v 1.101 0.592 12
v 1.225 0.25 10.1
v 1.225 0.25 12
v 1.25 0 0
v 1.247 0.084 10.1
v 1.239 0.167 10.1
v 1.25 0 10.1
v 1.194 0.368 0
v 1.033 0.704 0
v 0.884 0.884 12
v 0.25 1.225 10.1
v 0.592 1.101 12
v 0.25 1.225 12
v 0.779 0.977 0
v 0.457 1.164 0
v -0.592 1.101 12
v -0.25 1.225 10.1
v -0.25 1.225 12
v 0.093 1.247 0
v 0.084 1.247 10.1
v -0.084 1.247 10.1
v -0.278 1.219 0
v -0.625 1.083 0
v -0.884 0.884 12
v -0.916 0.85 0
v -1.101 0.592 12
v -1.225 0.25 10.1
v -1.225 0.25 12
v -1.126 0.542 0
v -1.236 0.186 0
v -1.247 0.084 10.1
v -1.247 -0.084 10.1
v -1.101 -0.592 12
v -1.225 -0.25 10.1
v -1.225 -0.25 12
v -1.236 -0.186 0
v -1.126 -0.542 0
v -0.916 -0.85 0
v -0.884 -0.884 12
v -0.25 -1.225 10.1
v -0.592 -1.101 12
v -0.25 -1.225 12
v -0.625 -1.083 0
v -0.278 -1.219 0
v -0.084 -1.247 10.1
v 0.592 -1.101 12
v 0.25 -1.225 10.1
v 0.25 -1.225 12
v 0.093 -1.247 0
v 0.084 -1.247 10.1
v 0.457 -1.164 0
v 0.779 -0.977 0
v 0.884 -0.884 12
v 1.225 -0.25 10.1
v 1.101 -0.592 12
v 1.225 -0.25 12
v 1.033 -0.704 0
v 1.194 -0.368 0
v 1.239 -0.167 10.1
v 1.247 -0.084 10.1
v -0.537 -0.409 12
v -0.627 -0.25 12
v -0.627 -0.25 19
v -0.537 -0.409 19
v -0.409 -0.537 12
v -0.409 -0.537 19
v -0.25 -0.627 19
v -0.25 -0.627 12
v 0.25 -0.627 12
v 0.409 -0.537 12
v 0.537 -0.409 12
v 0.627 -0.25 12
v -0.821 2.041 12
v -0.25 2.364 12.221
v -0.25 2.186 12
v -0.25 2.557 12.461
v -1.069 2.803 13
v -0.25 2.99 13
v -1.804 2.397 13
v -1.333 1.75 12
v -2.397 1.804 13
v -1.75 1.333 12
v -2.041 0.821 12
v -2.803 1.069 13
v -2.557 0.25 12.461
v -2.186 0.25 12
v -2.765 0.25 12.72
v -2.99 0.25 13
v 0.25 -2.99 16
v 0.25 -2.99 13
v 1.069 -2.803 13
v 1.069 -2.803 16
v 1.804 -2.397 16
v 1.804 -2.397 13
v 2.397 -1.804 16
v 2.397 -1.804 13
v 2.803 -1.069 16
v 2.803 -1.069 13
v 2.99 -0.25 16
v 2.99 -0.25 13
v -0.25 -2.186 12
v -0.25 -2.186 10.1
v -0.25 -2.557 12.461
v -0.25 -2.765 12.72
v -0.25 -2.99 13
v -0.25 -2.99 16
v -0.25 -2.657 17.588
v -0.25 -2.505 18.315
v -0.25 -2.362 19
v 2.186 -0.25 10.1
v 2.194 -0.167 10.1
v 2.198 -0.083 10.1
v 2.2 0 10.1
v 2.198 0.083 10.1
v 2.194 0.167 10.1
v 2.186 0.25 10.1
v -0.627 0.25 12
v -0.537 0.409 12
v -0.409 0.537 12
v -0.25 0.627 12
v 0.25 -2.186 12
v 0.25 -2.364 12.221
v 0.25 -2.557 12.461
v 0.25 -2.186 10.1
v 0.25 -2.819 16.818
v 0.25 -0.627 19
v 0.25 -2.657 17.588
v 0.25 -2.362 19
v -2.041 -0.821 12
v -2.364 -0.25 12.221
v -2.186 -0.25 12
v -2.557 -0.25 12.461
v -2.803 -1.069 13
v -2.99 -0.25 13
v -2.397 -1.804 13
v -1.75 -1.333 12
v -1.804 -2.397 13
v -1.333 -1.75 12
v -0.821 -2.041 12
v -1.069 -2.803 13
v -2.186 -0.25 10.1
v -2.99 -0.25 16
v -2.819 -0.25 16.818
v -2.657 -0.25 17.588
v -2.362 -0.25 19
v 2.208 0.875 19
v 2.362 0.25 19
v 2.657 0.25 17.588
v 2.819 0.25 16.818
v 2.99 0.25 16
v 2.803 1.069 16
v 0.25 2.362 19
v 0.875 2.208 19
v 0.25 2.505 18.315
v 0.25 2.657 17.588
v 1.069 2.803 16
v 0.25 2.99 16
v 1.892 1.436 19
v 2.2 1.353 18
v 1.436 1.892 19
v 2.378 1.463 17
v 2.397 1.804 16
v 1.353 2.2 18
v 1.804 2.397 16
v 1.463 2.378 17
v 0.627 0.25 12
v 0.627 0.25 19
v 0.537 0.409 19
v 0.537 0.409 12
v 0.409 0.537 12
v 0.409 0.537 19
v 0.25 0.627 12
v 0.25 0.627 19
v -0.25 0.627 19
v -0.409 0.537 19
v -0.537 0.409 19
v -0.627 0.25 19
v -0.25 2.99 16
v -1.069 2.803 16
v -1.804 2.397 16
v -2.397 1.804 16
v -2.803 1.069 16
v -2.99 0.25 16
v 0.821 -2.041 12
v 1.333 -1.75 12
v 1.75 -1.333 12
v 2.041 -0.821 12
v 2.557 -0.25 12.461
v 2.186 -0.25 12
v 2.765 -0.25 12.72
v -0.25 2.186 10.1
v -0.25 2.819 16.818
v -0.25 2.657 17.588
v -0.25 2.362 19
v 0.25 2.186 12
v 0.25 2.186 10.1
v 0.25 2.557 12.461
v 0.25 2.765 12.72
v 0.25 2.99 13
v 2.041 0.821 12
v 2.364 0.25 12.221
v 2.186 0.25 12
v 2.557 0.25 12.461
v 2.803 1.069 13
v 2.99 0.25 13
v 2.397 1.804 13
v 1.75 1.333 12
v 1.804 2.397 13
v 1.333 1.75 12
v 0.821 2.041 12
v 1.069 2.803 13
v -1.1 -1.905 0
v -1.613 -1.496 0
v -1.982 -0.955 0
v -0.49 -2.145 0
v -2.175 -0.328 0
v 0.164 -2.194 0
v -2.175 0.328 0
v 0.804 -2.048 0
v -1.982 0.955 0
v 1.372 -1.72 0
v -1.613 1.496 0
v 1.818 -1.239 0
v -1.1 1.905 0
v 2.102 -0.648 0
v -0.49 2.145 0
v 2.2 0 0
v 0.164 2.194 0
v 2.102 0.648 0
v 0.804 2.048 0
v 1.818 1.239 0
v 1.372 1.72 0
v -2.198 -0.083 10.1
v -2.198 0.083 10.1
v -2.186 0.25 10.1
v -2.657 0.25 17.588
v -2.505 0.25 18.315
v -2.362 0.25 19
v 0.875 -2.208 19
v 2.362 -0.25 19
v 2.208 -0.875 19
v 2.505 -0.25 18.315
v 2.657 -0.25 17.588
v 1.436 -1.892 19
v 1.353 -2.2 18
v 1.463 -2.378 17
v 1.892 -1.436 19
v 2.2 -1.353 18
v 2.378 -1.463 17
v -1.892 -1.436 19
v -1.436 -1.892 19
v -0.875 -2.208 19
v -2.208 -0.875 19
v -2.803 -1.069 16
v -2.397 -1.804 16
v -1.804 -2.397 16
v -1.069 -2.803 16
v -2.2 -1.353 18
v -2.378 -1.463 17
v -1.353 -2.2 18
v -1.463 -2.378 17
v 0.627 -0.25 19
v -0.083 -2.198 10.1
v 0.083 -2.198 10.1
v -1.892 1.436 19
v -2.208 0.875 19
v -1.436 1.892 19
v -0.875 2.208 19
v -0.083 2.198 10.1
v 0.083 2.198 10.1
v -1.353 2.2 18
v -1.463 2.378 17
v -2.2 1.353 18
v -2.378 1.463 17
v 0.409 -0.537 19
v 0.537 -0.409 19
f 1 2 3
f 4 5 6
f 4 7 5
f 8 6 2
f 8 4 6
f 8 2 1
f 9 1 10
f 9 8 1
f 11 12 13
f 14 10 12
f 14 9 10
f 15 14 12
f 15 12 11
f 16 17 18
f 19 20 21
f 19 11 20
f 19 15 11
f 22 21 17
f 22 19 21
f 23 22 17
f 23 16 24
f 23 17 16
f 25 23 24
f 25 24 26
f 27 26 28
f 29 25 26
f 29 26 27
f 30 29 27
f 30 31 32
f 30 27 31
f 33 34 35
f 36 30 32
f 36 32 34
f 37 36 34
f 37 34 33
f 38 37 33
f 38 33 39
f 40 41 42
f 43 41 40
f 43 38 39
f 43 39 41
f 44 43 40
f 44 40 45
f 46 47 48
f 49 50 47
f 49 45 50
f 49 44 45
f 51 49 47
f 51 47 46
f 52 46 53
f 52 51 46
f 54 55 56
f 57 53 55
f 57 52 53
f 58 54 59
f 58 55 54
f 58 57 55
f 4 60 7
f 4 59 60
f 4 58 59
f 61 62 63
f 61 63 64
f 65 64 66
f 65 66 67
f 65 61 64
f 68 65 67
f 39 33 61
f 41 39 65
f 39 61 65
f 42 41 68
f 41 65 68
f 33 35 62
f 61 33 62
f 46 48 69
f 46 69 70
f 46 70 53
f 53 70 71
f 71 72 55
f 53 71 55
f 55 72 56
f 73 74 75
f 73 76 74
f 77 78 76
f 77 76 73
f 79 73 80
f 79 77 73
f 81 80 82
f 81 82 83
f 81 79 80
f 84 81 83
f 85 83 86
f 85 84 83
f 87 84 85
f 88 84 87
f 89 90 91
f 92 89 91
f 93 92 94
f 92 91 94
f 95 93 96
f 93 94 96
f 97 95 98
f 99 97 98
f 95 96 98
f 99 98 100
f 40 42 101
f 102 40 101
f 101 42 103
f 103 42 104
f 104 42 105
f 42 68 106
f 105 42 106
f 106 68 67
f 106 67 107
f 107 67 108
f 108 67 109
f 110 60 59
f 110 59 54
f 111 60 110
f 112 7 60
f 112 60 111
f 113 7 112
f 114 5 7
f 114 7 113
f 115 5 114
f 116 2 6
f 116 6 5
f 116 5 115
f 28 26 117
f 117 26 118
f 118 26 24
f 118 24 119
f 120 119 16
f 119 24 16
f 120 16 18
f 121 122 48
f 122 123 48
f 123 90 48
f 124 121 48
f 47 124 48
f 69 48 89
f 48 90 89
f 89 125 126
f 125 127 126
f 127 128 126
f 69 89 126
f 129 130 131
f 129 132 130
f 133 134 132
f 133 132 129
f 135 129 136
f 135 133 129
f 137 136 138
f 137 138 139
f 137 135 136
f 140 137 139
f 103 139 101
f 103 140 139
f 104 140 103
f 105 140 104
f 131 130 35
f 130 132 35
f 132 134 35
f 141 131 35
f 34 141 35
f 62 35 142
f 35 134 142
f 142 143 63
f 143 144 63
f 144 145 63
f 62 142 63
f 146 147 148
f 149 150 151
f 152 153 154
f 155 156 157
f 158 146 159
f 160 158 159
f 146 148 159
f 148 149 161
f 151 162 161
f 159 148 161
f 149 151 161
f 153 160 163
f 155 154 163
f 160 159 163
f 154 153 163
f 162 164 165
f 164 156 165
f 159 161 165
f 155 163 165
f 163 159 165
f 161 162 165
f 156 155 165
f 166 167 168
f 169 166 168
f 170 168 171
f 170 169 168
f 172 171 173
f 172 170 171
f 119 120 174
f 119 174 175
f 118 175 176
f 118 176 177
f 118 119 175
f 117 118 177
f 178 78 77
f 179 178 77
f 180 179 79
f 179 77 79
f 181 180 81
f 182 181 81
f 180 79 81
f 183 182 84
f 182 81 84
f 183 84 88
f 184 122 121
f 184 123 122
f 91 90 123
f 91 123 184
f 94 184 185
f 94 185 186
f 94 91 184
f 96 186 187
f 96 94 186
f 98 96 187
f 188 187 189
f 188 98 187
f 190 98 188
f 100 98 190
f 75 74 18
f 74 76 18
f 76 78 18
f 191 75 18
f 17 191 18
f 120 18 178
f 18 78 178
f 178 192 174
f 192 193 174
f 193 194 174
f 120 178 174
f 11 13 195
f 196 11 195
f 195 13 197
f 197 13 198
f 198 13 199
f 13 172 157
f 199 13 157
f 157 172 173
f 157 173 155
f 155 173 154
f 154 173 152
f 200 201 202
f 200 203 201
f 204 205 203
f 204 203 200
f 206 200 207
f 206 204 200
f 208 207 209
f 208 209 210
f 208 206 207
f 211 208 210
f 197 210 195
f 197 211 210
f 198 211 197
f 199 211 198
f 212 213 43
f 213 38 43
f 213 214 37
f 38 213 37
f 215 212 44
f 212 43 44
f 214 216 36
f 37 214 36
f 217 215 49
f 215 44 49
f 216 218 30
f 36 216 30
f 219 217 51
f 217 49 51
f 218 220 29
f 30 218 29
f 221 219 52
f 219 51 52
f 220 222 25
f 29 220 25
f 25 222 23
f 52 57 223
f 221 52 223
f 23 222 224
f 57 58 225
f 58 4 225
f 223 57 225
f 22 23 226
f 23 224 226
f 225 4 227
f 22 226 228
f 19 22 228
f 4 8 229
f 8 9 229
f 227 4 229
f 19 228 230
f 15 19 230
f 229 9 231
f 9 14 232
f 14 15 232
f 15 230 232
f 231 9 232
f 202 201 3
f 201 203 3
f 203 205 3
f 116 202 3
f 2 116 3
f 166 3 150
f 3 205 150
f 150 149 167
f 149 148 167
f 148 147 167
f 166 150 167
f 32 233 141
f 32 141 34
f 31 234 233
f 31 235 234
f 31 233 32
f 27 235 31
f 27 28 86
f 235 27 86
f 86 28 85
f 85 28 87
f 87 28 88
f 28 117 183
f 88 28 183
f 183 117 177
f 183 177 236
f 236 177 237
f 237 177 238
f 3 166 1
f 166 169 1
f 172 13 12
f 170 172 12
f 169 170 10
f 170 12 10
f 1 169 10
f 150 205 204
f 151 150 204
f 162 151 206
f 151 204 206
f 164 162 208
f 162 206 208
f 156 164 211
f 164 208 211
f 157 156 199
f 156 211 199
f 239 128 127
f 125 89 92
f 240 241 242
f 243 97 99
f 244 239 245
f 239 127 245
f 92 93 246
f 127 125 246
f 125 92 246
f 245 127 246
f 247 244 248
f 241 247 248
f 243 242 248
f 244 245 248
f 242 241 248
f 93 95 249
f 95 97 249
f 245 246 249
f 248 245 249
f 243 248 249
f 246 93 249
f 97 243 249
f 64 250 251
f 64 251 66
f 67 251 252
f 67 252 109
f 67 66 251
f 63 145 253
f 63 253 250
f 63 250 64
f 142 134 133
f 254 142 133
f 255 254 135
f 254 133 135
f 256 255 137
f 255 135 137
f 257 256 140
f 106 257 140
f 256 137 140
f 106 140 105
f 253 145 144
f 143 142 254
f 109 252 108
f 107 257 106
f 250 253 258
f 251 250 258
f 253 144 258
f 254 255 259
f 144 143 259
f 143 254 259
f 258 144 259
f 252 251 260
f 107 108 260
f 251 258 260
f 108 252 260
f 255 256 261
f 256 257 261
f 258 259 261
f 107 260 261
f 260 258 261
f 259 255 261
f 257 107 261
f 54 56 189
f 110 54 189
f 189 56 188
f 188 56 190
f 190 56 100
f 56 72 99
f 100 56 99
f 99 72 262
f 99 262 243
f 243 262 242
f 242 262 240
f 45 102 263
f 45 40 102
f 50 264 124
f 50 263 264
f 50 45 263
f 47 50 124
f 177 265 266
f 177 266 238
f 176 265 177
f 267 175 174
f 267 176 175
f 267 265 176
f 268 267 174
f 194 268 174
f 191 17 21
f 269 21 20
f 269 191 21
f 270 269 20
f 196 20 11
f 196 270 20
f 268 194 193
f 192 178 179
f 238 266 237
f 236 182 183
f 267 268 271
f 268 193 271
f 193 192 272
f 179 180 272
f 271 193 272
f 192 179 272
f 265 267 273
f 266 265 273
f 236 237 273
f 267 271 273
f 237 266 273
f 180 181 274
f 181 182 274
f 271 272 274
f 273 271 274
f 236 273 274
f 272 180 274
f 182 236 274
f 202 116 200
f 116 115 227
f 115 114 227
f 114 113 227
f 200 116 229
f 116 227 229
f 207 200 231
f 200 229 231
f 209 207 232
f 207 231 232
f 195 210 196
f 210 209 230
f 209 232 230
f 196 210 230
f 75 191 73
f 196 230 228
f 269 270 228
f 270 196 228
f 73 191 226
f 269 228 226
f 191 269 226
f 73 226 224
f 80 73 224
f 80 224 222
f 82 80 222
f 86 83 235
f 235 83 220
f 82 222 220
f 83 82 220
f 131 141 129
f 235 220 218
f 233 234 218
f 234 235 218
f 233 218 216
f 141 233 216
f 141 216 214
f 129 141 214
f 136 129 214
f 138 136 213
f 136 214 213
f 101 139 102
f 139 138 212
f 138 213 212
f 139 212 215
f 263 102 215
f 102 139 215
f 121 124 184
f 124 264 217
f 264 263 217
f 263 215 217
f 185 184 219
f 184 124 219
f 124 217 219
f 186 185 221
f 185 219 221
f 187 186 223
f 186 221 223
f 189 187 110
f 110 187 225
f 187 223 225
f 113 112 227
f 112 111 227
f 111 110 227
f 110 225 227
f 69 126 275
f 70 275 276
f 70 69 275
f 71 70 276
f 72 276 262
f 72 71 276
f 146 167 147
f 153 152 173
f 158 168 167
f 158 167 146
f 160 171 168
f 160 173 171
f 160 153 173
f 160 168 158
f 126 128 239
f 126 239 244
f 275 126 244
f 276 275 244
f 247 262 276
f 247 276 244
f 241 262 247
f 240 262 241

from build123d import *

# Parameters (mm, degrees)
SKETCH1_R           = 2.2
SKETCH1_R_2         = 1.25
BOSS_EXTRUDE1_DEPTH = 12
SKETCH2_R           = 3
SKETCH2_R_2         = 0.675
BOSS_EXTRUDE2_DEPTH = 7
CUT_EXTRUDE1_DEPTH  = 8.9


with BuildPart() as part:
    # Sketch1 → Boss-Extrude1 (new body)
    with BuildSketch(Plane.XY):
        Circle(SKETCH1_R)
        Circle(SKETCH1_R_2, mode=Mode.SUBTRACT)
    extrude(amount=BOSS_EXTRUDE1_DEPTH)

    # Sketch2 → Boss-Extrude2 (add)
    with BuildSketch(Plane.XY.offset(12)):
        Circle(SKETCH2_R)
        Circle(SKETCH2_R_2, mode=Mode.SUBTRACT)
    extrude(amount=BOSS_EXTRUDE2_DEPTH)

    # Sketch3 → Cut-Revolve1 (revolve, cut)
    with BuildSketch(Plane(origin=(0, 0, 0), x_dir=(1, 0, 0), z_dir=(0, 1, 0))):
        Polygon((2.2, -12), (3, -13), (4.276308893, -12.361058563), (3.46784885, -11.152134436), align=None)
        Polygon((2.375, -19), (3, -16), (5.751760011, -17.171813113), (4.254862661, -20.939605223), align=None)
    revolve(axis=Axis((0, 0, 0), (0, 0, 1)), mode=Mode.SUBTRACT)

    # Sketch4 → Cut-Extrude1 (cut)
    with BuildSketch(Plane.XY.offset(19)):
        Polygon((0, 3.340763125), (-0.25, 3.340763125), (-0.25, 0.464842209), (0.25, 0.464842209), (0.25, 3.340763125), align=None)
        Polygon((3.340763125, 0), (3.340763125, 0.25), (0.464842209, 0.25), (0.464842209, -0.25), (3.340763125, -0.25), align=None)
        Polygon((0, -3.340763125), (0.25, -3.340763125), (0.25, -0.464842209), (-0.25, -0.464842209), (-0.25, -3.340763125), align=None)
        Polygon((-3.340763125, 0), (-3.340763125, -0.25), (-0.464842209, -0.25), (-0.464842209, 0.25), (-3.340763125, 0.25), align=None)
    extrude(amount=-CUT_EXTRUDE1_DEPTH, mode=Mode.SUBTRACT)


solid = part.part
